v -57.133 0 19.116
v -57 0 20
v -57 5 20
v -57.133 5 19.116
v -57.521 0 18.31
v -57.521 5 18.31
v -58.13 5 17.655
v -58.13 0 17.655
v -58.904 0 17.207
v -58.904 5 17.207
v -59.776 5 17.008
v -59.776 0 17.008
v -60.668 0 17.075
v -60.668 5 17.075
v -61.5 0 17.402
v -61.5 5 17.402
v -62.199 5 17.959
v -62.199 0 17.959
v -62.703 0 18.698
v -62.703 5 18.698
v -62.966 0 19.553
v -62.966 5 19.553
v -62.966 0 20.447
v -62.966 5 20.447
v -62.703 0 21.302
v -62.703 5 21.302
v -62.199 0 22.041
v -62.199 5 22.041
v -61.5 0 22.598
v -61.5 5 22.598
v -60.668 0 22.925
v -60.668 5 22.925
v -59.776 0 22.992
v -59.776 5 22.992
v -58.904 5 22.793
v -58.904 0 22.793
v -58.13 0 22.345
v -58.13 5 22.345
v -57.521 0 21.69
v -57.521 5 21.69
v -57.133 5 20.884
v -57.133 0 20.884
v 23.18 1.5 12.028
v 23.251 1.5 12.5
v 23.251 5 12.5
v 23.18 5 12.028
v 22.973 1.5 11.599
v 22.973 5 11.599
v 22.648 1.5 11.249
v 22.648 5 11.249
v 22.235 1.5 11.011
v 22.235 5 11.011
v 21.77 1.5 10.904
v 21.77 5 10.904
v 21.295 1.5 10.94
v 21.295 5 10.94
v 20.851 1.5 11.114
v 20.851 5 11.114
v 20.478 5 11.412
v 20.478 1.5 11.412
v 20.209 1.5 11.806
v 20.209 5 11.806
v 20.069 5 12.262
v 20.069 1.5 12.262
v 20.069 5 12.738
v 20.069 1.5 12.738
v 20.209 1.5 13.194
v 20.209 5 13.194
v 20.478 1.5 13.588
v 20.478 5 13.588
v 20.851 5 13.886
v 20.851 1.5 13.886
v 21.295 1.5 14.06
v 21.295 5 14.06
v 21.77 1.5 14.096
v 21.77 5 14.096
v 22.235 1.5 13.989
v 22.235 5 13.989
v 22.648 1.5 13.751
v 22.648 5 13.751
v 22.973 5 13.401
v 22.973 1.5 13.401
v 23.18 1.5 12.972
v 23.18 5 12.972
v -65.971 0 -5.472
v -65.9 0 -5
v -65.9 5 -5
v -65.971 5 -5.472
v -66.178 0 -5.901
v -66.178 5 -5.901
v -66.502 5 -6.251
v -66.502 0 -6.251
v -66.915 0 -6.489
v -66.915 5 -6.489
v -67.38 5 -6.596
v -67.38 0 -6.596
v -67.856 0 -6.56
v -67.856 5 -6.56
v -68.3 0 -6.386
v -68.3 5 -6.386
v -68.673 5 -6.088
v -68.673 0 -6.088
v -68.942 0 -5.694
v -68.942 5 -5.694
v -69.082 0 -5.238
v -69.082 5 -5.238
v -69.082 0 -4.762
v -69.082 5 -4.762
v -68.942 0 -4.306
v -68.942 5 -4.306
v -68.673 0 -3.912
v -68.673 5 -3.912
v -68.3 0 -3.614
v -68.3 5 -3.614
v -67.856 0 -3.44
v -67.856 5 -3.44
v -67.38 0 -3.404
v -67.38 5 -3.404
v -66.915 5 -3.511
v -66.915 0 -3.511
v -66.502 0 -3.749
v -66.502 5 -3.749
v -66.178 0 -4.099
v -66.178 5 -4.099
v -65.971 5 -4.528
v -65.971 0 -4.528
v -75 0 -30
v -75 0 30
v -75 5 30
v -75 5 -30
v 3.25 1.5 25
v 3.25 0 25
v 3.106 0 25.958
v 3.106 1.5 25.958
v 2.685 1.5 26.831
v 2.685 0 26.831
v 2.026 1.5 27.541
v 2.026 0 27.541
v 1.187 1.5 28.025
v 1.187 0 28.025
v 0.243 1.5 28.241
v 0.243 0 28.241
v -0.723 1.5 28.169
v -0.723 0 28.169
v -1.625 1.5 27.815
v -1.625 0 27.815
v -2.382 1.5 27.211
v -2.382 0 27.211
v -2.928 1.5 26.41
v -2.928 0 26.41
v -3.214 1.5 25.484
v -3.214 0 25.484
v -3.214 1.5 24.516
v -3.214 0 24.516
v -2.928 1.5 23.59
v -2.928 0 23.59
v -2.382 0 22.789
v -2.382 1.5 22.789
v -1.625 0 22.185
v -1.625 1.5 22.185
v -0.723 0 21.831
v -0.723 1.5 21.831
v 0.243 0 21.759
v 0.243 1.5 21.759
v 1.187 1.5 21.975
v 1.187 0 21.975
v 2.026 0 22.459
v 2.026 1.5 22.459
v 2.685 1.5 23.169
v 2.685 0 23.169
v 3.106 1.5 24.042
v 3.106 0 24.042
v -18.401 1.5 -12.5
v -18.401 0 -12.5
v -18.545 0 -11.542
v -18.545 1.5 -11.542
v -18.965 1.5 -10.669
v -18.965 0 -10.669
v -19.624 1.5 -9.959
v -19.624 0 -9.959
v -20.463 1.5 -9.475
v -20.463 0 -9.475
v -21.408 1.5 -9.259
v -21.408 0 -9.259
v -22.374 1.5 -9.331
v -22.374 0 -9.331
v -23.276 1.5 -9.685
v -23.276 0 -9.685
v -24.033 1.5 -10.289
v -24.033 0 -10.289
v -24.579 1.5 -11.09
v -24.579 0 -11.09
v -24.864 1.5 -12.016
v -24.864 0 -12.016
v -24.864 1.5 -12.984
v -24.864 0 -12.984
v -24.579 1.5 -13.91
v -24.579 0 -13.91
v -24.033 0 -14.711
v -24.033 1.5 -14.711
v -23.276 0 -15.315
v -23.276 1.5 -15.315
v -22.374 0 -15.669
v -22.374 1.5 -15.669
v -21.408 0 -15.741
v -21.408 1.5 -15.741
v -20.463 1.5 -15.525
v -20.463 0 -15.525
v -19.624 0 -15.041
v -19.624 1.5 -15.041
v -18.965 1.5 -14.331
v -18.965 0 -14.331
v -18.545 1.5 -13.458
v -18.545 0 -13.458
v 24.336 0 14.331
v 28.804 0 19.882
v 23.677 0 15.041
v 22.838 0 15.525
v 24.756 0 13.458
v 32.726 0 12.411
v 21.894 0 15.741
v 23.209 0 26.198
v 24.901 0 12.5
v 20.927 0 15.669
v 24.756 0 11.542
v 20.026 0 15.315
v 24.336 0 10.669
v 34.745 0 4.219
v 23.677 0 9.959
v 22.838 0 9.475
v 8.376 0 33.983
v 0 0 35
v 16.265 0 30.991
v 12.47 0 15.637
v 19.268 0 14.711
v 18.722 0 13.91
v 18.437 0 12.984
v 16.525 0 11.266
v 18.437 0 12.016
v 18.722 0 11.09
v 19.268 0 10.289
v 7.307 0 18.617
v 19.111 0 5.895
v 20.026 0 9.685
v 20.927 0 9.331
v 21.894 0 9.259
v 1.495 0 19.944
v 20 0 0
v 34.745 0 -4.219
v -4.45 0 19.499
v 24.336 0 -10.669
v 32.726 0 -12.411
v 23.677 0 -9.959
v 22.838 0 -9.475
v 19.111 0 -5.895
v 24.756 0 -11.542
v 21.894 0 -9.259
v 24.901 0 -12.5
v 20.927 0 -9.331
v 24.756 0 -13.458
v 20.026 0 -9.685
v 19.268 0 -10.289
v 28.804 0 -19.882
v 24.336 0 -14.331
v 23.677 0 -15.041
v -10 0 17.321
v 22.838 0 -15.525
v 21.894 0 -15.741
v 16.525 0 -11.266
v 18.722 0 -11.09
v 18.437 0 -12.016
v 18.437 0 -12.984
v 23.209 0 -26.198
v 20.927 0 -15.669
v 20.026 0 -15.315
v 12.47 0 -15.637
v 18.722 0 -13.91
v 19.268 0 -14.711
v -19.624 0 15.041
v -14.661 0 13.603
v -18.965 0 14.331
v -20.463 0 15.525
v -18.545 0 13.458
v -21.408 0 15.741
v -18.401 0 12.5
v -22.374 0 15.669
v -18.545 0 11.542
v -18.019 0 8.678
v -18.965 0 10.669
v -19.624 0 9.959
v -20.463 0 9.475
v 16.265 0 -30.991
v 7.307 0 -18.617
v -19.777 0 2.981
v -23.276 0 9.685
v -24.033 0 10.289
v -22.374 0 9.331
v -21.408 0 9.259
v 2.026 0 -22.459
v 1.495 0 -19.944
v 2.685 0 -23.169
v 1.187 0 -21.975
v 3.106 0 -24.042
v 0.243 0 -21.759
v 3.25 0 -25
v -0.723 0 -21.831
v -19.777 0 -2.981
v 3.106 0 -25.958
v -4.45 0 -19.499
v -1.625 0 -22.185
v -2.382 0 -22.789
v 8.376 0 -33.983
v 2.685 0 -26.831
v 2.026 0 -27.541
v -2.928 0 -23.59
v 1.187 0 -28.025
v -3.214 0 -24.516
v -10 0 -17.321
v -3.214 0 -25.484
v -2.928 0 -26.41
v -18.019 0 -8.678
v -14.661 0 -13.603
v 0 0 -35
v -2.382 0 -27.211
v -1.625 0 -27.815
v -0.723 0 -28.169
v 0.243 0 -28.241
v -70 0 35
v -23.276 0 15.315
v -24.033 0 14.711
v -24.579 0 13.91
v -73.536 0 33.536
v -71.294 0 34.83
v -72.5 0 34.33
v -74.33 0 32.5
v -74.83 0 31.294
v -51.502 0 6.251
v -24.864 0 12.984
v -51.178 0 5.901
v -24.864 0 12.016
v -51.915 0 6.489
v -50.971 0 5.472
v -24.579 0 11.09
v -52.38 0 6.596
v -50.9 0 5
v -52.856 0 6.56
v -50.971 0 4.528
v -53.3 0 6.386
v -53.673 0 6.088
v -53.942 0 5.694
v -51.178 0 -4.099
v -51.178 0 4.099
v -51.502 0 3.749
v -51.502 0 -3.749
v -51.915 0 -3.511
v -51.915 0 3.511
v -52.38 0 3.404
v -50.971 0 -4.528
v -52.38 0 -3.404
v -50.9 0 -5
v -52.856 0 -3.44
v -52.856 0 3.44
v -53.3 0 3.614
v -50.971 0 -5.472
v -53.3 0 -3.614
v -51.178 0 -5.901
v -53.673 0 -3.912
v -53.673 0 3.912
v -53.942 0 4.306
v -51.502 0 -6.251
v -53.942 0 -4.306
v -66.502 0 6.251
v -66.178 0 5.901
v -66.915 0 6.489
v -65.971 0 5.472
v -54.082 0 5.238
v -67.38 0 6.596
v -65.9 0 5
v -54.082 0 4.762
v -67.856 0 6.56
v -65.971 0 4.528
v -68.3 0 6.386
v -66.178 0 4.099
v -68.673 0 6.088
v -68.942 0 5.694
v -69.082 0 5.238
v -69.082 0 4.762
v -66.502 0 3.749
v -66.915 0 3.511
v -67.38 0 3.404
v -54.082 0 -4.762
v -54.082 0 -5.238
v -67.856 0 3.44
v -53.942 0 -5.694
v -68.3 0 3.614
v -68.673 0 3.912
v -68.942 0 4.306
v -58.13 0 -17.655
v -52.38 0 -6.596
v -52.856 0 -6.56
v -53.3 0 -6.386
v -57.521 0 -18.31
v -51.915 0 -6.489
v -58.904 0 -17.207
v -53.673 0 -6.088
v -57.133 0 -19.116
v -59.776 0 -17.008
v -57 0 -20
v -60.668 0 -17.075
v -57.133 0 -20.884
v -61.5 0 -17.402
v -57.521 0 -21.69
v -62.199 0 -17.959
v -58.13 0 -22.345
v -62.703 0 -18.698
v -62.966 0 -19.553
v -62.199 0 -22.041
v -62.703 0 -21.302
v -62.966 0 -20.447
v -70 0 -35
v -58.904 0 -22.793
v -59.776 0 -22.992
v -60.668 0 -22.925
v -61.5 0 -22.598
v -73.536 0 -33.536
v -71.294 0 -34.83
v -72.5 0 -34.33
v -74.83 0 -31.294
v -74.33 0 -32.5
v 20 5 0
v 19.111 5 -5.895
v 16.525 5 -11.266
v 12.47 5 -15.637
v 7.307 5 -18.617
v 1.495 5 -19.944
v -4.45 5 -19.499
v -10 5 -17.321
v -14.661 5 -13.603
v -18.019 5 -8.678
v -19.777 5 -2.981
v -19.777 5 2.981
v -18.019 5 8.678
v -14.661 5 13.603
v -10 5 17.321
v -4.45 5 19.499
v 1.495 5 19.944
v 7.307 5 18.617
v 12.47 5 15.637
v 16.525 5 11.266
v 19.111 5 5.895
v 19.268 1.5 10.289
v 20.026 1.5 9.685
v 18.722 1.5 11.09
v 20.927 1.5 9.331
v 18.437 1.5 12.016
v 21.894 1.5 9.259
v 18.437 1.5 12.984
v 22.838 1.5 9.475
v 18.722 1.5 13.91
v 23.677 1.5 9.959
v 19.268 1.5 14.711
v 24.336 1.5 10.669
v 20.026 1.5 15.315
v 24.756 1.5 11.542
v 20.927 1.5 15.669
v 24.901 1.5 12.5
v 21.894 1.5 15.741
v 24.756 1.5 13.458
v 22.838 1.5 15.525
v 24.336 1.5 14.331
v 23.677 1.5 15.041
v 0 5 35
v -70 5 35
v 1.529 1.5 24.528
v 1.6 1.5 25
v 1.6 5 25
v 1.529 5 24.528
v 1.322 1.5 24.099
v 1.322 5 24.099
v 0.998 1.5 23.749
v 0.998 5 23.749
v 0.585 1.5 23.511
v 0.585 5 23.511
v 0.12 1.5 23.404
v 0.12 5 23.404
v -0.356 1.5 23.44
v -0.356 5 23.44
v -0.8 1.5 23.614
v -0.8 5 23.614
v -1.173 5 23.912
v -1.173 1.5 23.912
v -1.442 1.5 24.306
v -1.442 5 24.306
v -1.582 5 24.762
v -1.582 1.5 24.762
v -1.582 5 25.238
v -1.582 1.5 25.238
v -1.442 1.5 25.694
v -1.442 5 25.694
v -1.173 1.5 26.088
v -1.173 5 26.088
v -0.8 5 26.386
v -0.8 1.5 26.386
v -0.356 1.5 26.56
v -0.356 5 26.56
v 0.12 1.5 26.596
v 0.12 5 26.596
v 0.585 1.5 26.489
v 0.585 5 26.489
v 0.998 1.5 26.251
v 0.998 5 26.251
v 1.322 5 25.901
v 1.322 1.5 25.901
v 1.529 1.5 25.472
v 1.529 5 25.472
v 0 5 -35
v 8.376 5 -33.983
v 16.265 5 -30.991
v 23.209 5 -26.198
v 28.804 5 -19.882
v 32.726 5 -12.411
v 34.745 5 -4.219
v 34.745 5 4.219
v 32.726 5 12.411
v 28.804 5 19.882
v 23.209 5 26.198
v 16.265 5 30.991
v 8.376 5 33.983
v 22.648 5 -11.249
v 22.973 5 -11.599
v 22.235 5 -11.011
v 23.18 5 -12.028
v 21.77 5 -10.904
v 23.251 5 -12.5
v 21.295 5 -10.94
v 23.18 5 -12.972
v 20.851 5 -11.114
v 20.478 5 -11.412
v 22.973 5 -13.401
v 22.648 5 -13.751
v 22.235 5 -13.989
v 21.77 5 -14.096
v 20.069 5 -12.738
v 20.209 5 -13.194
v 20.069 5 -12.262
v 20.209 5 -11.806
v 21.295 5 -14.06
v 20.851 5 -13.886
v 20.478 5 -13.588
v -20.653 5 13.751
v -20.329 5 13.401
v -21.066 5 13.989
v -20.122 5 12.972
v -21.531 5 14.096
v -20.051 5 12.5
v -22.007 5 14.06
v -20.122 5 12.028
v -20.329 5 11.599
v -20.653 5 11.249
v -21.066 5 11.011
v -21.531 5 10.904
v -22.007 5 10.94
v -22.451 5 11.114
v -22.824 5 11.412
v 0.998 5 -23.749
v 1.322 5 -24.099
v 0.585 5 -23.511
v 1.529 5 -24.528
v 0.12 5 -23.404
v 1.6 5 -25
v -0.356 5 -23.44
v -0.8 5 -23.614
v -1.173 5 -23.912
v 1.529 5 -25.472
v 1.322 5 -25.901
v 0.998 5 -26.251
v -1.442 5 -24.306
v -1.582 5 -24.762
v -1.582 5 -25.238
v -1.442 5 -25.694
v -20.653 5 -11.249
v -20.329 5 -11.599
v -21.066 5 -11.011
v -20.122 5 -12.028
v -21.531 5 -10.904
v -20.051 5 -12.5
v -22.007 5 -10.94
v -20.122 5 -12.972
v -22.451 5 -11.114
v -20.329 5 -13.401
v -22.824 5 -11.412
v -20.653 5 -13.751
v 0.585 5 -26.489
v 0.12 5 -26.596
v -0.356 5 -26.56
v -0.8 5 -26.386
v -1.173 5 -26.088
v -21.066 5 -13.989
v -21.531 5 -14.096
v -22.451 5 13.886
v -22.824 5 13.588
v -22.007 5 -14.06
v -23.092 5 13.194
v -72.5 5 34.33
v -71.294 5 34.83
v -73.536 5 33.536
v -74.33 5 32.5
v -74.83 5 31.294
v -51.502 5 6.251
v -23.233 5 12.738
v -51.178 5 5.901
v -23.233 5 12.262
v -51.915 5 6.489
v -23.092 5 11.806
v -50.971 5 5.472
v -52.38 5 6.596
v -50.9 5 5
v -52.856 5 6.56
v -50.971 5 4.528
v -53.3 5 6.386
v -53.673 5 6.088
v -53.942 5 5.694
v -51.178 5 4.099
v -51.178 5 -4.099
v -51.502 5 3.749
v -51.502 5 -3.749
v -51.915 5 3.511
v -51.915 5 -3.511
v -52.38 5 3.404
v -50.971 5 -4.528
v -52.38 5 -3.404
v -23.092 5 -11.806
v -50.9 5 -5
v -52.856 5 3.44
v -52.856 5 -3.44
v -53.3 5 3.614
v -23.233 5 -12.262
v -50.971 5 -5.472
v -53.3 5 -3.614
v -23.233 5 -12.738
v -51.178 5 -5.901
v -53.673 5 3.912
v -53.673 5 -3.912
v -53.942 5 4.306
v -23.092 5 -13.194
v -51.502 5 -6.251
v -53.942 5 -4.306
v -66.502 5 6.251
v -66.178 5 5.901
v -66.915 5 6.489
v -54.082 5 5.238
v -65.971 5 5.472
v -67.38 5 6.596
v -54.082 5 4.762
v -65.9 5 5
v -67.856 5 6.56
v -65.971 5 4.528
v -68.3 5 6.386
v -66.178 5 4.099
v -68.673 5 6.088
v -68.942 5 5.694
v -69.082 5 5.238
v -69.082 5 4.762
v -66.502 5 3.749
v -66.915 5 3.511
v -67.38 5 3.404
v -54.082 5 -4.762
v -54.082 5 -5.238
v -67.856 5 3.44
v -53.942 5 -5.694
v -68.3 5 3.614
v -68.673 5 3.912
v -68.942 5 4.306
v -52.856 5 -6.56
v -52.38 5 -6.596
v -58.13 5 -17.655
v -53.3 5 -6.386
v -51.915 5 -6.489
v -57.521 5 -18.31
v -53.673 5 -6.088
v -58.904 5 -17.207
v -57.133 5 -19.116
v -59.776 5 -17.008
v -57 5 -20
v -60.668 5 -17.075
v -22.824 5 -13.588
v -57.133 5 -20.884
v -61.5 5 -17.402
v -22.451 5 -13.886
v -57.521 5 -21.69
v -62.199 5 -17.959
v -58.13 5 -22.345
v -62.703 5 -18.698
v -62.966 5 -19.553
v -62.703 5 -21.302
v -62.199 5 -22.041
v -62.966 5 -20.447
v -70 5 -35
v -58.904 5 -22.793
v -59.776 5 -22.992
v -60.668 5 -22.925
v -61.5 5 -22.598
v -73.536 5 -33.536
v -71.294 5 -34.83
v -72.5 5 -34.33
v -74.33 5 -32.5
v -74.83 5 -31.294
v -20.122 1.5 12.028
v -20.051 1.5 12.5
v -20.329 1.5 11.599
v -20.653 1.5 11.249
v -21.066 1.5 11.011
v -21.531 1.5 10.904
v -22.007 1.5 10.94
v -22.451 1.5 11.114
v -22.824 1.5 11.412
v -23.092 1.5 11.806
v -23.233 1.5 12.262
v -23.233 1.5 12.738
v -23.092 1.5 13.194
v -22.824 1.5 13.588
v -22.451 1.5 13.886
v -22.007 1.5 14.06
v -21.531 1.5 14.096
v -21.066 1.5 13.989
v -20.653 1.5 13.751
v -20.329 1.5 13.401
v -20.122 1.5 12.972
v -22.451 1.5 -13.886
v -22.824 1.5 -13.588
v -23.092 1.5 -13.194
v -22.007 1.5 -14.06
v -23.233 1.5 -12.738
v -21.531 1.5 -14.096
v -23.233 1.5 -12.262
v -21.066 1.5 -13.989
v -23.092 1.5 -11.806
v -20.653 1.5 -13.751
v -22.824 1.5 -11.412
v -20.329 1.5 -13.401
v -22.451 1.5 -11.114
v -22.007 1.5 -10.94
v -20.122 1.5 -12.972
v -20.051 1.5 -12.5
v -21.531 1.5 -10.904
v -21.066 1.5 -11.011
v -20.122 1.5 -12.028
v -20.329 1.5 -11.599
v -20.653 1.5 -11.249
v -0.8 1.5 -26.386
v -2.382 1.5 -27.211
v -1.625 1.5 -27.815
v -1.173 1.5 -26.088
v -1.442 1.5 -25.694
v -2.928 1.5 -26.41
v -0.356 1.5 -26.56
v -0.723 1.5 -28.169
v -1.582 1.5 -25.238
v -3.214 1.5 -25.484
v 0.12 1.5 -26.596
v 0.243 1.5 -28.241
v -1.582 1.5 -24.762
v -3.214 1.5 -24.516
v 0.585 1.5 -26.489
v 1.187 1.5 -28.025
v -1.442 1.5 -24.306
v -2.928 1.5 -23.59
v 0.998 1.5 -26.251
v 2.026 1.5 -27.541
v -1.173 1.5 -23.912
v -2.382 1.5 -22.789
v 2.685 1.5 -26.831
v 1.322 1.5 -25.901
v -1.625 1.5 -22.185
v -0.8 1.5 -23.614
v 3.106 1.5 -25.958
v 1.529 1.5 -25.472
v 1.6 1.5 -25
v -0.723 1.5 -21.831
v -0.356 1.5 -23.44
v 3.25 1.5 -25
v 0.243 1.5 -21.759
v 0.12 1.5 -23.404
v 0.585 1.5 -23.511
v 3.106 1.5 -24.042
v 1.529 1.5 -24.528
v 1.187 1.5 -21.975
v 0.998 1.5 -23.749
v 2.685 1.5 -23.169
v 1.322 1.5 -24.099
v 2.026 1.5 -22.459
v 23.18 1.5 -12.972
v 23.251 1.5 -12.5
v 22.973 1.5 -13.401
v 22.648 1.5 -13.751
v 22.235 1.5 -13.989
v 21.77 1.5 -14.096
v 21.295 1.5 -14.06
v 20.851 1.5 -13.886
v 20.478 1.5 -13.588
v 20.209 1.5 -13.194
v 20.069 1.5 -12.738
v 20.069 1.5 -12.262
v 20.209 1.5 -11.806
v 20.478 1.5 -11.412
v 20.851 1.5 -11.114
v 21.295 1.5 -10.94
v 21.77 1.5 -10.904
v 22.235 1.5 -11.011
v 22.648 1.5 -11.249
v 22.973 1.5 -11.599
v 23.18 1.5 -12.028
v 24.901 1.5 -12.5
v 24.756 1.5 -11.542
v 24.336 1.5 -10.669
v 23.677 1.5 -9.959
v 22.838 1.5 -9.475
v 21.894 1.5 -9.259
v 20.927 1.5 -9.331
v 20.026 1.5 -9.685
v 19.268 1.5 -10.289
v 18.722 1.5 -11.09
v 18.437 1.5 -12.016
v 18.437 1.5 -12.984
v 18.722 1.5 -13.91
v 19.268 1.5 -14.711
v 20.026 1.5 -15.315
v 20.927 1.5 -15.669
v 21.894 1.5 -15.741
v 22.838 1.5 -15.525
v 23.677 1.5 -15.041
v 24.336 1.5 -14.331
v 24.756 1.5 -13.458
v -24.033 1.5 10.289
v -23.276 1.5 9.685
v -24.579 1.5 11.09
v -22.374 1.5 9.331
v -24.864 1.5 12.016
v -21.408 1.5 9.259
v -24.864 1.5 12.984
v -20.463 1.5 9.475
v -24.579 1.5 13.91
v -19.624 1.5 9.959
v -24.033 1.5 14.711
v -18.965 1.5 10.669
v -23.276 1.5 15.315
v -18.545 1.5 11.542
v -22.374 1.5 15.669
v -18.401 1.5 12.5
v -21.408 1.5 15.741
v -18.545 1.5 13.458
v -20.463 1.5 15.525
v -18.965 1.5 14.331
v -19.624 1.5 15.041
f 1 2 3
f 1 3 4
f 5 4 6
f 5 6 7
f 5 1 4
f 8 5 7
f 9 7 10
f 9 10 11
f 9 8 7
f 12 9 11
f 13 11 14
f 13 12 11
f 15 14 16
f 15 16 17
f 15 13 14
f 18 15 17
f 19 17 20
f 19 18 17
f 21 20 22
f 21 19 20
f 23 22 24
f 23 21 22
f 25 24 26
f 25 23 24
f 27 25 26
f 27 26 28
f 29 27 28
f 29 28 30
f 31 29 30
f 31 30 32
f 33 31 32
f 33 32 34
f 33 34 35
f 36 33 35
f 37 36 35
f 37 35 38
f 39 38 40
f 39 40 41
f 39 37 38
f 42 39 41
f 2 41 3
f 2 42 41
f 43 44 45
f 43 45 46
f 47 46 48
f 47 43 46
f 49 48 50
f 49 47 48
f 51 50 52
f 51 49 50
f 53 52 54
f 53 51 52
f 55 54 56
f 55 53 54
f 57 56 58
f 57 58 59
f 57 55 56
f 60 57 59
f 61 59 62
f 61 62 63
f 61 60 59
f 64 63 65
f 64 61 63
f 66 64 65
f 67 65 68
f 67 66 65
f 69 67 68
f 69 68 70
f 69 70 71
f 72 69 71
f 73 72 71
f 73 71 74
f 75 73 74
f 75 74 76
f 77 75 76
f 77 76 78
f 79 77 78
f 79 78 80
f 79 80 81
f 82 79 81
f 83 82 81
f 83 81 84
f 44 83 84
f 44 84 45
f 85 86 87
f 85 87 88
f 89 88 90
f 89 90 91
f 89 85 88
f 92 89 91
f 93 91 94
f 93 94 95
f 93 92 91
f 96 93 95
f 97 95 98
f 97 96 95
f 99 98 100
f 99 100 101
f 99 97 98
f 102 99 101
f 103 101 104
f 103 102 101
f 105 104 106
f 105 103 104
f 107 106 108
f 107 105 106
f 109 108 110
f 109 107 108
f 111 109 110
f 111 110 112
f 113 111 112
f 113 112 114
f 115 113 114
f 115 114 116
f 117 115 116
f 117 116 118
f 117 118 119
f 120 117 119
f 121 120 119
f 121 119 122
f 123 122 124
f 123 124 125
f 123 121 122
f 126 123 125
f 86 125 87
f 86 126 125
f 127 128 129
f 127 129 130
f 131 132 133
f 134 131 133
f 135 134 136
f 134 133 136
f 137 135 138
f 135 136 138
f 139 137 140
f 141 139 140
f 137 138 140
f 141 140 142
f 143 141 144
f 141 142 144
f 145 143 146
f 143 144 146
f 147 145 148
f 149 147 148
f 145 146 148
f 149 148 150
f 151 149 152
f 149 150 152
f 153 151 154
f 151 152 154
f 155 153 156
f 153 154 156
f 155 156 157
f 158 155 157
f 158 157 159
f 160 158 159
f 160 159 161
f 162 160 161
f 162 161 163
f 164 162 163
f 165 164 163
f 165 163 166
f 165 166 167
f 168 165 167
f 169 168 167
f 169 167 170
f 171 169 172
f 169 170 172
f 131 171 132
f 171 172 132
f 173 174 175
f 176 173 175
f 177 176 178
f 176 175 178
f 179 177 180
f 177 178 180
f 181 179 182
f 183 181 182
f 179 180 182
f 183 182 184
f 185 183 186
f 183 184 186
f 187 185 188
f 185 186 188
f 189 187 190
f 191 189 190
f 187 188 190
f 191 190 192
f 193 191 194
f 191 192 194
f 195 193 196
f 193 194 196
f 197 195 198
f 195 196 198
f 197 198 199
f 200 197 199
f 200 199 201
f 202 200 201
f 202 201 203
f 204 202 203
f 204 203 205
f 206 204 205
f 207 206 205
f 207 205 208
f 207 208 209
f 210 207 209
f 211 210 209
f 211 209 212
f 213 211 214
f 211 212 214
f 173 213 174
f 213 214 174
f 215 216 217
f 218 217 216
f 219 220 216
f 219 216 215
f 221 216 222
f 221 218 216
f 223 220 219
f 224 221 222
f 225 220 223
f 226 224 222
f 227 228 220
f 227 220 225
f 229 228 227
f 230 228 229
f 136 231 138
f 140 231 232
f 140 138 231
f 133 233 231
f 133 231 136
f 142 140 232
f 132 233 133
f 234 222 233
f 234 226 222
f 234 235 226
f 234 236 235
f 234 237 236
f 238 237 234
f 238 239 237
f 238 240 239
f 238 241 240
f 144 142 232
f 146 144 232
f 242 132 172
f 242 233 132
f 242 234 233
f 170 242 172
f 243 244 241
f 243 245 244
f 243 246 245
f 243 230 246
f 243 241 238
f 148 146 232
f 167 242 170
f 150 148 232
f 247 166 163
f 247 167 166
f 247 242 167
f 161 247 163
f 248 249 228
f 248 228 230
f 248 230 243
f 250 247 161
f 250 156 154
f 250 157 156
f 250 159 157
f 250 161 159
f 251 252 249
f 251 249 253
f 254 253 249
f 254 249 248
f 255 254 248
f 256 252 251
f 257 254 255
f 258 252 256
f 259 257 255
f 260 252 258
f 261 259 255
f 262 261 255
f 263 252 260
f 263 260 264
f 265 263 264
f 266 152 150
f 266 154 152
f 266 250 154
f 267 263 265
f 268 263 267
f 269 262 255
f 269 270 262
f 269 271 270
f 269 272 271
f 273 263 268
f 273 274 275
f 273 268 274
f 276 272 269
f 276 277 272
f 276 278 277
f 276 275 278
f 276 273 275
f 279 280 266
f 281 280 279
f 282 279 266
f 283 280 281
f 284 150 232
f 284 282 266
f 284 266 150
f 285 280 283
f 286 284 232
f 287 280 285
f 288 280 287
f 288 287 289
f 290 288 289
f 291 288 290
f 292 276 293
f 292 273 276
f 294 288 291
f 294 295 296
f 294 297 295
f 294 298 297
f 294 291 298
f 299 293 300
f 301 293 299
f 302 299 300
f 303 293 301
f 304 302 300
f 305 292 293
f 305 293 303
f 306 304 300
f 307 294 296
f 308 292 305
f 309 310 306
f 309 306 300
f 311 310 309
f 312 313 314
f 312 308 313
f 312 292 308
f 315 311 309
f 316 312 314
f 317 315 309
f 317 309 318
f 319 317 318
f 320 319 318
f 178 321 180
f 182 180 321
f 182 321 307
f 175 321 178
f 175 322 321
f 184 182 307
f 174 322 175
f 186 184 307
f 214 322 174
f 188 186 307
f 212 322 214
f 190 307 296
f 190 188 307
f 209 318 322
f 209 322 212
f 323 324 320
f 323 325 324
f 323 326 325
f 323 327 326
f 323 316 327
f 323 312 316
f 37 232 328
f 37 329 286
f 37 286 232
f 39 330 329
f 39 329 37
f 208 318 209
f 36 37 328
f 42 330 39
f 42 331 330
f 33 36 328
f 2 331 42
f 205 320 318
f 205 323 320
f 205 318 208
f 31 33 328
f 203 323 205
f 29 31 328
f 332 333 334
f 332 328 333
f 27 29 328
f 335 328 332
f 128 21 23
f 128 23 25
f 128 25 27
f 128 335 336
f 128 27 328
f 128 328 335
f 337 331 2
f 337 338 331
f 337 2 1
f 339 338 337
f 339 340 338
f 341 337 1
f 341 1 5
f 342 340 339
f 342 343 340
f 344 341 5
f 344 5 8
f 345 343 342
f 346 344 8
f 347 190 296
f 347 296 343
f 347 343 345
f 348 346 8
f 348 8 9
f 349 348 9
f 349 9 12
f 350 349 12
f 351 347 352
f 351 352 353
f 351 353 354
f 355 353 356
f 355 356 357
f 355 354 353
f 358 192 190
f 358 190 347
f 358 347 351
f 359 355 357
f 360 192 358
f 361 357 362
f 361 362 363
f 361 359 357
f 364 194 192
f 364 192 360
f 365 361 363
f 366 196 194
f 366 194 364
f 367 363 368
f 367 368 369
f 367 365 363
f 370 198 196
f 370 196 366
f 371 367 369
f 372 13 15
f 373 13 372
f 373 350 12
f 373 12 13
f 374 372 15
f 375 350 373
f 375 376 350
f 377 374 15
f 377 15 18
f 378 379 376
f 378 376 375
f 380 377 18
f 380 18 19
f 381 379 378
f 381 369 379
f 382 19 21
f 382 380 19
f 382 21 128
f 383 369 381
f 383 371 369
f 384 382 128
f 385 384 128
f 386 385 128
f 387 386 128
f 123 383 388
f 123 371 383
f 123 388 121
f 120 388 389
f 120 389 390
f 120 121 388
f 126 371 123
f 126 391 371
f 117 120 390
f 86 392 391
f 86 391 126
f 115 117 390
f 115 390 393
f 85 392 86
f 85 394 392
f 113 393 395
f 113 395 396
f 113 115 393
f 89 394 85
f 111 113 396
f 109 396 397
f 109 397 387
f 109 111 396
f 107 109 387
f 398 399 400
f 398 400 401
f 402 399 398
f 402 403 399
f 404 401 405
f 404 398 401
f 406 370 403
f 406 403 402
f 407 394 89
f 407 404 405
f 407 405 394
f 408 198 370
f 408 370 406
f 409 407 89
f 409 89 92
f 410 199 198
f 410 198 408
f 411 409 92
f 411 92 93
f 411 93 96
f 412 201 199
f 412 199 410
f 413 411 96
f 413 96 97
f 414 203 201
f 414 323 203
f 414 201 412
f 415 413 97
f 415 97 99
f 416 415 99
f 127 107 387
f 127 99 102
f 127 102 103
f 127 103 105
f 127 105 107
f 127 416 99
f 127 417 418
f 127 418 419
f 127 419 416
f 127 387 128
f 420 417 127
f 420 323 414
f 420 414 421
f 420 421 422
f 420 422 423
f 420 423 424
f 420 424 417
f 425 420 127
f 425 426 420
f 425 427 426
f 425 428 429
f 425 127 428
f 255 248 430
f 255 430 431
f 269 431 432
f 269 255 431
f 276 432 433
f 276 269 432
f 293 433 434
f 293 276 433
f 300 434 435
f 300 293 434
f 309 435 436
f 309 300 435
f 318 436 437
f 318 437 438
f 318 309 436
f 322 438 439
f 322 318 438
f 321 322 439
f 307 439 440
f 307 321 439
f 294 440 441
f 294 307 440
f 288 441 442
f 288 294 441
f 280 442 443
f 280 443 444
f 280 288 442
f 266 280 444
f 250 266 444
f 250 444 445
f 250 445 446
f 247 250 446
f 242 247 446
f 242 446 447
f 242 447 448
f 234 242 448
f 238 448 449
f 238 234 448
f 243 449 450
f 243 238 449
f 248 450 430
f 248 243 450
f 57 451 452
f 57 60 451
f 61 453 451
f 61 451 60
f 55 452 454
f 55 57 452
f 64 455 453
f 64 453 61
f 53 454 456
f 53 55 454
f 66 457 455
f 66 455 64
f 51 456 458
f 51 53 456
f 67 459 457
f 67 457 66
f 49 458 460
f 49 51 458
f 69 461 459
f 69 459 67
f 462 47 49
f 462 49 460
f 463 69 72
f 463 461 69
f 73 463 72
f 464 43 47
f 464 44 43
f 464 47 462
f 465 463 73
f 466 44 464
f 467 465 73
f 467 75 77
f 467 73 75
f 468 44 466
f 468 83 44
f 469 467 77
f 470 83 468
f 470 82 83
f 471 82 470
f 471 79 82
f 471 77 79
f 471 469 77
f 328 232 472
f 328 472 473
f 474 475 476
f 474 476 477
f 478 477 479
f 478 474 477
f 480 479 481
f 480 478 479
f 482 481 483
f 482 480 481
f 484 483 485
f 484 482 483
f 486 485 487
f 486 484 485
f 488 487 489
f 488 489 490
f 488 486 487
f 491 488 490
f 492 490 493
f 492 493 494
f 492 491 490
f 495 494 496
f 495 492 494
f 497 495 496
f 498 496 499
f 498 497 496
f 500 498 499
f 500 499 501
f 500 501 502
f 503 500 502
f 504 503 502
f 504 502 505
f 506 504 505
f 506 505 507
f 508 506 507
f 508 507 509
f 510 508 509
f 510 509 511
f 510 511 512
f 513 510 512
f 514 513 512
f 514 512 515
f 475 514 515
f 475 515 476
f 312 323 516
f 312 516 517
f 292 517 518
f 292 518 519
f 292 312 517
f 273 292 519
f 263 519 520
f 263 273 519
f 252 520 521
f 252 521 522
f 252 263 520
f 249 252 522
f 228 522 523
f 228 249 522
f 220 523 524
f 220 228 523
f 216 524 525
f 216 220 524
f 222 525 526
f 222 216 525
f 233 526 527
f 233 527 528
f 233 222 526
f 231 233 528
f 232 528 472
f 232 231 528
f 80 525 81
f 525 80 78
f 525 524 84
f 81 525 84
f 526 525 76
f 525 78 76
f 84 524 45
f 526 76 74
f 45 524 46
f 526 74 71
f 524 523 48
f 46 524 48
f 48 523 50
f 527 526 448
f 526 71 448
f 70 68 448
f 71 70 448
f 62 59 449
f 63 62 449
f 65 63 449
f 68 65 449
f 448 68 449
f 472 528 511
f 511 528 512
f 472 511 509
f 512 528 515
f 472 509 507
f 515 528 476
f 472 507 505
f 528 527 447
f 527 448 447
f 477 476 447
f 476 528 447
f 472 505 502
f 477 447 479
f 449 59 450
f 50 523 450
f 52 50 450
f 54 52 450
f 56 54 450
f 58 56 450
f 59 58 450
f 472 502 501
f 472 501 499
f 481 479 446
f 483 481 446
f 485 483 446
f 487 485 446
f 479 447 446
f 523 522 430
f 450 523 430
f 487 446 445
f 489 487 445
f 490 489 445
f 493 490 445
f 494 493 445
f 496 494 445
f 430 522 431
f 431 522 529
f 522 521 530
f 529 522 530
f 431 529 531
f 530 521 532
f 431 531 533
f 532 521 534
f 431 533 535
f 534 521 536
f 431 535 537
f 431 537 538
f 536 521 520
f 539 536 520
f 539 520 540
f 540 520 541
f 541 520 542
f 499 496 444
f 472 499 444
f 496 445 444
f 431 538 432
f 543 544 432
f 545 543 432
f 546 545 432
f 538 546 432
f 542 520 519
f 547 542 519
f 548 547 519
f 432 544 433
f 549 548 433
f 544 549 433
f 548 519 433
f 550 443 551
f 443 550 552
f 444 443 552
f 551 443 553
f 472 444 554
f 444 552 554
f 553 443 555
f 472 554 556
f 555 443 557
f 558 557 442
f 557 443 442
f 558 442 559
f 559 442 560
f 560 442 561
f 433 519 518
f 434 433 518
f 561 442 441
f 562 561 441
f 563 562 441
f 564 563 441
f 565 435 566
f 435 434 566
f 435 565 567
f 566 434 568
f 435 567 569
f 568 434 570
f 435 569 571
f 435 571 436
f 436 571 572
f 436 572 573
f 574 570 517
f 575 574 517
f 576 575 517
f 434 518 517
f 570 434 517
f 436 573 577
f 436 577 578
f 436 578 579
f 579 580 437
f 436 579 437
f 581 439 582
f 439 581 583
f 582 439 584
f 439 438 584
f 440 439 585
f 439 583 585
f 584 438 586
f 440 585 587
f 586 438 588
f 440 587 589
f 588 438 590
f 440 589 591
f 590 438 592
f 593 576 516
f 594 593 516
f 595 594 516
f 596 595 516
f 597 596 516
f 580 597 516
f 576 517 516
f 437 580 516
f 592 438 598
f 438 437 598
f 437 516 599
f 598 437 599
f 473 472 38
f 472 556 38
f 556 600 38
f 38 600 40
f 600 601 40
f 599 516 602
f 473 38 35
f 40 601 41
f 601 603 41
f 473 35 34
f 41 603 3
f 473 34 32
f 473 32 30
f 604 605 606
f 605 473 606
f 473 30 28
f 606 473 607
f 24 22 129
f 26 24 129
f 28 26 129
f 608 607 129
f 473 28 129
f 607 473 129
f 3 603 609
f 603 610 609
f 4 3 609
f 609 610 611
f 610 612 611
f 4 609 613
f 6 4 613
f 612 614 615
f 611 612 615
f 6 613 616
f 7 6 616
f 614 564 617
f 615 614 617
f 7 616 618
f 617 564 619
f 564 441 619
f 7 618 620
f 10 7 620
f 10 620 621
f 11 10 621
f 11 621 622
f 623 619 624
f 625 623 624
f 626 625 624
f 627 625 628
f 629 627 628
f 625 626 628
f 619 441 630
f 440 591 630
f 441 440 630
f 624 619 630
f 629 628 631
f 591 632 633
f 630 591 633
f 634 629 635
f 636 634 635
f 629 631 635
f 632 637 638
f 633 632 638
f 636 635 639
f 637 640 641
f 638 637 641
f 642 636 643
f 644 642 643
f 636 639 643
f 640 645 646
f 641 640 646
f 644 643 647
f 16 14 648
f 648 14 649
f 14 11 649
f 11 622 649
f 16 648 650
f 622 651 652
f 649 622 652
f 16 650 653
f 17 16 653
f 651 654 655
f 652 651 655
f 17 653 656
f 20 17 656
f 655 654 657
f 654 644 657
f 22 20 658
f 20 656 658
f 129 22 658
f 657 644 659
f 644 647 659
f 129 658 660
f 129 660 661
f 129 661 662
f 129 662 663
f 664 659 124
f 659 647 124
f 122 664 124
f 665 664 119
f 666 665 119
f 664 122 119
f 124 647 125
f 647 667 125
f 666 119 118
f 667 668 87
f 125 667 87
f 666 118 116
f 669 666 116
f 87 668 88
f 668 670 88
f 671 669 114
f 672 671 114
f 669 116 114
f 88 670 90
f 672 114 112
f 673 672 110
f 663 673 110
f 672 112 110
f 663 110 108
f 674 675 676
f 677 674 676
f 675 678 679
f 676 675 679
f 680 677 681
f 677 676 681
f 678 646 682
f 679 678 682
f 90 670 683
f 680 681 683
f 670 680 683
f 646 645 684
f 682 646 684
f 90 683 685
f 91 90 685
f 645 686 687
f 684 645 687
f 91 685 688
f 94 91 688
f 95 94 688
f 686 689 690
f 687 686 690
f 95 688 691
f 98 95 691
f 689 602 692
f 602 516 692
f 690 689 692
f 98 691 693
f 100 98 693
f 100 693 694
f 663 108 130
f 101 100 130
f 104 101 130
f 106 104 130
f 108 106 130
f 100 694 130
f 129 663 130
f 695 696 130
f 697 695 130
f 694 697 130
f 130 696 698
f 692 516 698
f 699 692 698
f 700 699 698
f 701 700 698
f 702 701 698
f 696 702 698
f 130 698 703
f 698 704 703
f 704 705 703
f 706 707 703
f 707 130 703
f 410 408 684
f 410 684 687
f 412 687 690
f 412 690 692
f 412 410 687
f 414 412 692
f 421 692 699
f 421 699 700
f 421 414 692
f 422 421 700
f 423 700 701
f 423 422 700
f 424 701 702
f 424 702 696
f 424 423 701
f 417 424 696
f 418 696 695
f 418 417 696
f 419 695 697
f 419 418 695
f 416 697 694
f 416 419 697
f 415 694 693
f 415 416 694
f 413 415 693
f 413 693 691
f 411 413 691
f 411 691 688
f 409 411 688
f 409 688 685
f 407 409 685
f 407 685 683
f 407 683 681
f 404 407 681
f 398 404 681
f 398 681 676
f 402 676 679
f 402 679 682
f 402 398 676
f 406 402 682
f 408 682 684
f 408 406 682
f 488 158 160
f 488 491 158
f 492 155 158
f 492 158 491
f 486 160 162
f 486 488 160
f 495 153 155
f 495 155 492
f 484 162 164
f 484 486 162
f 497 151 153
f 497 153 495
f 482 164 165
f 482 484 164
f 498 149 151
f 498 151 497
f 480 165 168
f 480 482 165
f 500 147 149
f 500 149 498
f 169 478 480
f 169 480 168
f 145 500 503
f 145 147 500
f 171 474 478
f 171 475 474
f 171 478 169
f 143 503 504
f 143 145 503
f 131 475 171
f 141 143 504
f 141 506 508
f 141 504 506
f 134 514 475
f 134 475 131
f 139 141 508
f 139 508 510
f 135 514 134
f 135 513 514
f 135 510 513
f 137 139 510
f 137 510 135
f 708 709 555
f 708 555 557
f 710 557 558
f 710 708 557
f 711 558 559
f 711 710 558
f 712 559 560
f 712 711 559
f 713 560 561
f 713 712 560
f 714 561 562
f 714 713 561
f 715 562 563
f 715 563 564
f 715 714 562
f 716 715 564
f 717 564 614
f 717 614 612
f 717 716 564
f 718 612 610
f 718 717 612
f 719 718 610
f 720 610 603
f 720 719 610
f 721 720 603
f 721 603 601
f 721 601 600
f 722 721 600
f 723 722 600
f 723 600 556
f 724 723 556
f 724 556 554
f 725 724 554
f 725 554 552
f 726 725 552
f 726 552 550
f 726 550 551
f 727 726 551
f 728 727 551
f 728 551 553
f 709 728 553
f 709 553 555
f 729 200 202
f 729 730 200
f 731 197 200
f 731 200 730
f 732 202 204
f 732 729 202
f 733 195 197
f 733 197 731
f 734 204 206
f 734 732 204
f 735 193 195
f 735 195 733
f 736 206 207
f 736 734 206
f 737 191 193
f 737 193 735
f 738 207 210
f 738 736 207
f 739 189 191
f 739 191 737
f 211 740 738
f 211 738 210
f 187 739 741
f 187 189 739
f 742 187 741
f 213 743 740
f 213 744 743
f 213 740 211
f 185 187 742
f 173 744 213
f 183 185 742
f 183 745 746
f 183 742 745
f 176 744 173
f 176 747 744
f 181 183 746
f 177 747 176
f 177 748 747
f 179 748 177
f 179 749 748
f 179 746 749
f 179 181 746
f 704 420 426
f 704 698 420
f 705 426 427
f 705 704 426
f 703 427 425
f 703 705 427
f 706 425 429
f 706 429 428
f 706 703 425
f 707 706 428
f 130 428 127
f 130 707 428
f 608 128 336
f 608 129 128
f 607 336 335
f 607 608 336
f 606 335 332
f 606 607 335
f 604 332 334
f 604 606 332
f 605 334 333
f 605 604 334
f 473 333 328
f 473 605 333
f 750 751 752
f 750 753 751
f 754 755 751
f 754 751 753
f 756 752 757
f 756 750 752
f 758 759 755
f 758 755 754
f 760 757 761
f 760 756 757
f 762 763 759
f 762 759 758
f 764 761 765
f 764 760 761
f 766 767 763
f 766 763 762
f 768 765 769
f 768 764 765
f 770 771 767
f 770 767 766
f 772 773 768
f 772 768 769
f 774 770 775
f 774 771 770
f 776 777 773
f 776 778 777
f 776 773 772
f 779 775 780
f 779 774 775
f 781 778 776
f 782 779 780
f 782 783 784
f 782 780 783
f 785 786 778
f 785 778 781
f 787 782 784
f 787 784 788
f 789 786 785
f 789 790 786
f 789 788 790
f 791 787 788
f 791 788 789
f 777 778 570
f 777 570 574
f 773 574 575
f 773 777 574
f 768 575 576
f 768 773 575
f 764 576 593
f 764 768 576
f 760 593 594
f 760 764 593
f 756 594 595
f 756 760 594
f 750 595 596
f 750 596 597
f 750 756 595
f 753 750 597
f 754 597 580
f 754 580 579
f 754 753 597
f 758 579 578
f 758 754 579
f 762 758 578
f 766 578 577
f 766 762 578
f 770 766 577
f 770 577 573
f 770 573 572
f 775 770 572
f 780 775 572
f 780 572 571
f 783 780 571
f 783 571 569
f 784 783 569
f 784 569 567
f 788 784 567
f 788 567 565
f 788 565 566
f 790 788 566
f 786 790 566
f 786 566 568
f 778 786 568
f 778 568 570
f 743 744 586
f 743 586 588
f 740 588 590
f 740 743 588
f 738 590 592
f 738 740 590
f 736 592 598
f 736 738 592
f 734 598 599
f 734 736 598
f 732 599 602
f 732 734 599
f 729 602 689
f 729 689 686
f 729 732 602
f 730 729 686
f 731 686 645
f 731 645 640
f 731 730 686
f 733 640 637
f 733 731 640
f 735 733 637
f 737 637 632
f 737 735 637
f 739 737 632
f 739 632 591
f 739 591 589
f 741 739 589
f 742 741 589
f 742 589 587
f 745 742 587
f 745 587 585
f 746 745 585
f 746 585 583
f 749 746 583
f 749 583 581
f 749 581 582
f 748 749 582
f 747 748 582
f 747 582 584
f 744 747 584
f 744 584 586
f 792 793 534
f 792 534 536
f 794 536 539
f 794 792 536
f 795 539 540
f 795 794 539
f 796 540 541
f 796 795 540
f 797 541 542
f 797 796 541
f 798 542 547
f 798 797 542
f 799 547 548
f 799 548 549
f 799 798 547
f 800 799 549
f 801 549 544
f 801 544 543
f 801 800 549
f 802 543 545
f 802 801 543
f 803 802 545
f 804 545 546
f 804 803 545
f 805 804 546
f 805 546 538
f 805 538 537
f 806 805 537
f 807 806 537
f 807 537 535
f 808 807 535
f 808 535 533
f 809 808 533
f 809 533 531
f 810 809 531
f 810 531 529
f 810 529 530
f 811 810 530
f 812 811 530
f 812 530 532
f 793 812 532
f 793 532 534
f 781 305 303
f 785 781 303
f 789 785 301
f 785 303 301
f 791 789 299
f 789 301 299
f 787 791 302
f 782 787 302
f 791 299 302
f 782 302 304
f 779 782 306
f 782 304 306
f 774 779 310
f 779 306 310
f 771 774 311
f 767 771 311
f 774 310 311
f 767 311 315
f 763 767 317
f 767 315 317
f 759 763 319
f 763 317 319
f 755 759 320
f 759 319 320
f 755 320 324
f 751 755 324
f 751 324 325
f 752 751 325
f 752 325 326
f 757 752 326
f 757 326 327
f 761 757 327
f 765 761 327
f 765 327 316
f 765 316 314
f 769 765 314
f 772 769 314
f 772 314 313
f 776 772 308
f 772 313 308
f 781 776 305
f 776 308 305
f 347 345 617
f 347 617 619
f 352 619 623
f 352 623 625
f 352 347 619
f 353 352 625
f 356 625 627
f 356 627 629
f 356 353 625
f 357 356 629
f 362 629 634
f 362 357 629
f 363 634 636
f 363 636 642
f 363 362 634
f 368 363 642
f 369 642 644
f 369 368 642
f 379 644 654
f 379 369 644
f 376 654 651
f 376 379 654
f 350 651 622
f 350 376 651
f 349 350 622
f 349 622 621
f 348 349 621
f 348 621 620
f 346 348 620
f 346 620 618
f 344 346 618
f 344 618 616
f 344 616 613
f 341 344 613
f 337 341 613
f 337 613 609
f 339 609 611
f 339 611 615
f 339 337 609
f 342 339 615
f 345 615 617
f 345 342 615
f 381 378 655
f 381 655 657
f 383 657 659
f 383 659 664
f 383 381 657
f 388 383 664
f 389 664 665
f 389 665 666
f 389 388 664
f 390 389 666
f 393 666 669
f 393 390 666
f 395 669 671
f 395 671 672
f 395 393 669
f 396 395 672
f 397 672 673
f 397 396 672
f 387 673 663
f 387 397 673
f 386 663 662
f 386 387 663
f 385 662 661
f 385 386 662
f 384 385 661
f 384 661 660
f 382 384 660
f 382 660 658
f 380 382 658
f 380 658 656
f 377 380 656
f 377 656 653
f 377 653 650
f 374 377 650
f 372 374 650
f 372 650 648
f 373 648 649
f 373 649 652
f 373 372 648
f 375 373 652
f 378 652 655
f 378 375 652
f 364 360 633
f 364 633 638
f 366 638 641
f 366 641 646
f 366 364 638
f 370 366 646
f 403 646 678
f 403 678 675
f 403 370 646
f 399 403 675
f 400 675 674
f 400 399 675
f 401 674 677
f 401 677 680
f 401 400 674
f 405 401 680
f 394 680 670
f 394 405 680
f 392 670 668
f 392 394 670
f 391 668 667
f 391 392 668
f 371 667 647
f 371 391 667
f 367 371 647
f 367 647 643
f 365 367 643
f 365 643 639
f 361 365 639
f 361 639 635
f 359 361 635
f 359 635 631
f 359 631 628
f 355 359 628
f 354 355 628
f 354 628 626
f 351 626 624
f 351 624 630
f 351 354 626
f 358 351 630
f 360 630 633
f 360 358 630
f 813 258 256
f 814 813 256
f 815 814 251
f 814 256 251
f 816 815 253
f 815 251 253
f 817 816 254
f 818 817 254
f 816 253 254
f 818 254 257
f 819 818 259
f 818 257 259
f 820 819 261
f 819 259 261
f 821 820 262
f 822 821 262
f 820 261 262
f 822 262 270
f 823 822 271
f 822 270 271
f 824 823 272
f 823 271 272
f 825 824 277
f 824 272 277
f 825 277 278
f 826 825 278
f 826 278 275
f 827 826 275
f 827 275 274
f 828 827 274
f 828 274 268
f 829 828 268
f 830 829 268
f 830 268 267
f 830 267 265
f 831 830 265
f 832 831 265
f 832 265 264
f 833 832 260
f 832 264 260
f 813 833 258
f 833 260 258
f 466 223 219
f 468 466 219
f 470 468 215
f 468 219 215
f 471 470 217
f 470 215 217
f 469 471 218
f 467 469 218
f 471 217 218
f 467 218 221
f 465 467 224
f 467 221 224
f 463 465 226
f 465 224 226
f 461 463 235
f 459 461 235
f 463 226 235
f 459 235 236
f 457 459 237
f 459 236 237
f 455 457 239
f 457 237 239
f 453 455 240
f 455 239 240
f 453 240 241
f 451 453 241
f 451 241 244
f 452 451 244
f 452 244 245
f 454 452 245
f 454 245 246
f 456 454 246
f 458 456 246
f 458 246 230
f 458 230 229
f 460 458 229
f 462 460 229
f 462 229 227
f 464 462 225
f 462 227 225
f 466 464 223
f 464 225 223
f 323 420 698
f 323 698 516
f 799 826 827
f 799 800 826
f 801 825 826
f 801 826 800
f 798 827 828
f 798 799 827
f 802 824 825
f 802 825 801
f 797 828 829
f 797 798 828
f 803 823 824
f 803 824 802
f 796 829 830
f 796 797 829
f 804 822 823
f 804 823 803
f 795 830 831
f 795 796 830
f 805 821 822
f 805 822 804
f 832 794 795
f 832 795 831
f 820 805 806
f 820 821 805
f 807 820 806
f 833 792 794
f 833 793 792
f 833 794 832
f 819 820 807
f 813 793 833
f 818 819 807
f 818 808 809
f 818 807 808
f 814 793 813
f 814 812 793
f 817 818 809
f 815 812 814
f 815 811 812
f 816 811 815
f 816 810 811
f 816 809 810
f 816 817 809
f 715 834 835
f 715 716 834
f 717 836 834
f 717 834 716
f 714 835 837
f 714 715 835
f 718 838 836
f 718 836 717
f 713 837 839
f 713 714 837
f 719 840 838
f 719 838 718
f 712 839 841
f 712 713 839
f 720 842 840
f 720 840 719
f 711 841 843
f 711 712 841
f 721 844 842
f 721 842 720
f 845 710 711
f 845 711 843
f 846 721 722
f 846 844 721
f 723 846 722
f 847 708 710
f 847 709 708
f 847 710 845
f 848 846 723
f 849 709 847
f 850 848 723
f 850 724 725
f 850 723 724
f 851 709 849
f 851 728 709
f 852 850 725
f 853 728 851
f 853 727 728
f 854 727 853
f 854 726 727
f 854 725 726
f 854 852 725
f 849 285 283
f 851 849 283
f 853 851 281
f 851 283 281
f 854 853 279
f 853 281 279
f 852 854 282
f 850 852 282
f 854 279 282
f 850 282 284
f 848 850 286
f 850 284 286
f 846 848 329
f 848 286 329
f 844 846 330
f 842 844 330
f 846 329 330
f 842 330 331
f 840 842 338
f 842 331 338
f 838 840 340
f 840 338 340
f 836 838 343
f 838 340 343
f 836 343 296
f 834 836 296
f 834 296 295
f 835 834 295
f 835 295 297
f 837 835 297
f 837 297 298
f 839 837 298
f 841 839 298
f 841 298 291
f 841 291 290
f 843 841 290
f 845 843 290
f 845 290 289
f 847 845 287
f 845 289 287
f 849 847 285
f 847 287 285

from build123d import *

# Parameters (mm, degrees)
SKETCH1_R           = 1.6
SKETCH1_R_2         = 20
SKETCH1_R_3         = 3
BOSS_EXTRUDE1_DEPTH = 5
FILLET1_R           = 5
SKETCH4_R           = 3.25
CUT_EXTRUDE2_DEPTH  = 1.5


with BuildPart() as part:
    # Sketch1 → Boss-Extrude1 (new body)
    with BuildSketch(Plane(origin=(0, 0, 0), x_dir=(1, 0, 0), z_dir=(0, 1, 0))):
        with BuildLine():
            Line((-75, 35), (0, 35))
            ThreePointArc((0, 35), (35, 0), (0, -35))
            Line((0, -35), (-75, -35))
            Line((-75, -35), (-75, 35))
        make_face()
        with Locations((0, 25)):
            Circle(SKETCH1_R, mode=Mode.SUBTRACT)
        with Locations((21.650635095, 12.5)):
            Circle(SKETCH1_R, mode=Mode.SUBTRACT)
        with Locations((21.650635095, -12.5)):
            Circle(SKETCH1_R, mode=Mode.SUBTRACT)
        with Locations((0, -25)):
            Circle(SKETCH1_R, mode=Mode.SUBTRACT)
        with Locations((-21.650635095, -12.5)):
            Circle(SKETCH1_R, mode=Mode.SUBTRACT)
        with Locations((-21.650635095, 12.5)):
            Circle(SKETCH1_R, mode=Mode.SUBTRACT)
        Circle(SKETCH1_R_2, mode=Mode.SUBTRACT)
        with Locations((-67.5, 5)):
            Circle(SKETCH1_R, mode=Mode.SUBTRACT)
        with Locations((-52.5, 5)):
            Circle(SKETCH1_R, mode=Mode.SUBTRACT)
        with Locations((-52.5, -5)):
            Circle(SKETCH1_R, mode=Mode.SUBTRACT)
        with Locations((-67.5, -5)):
            Circle(SKETCH1_R, mode=Mode.SUBTRACT)
        with Locations((-60, 20)):
            Circle(SKETCH1_R_3, mode=Mode.SUBTRACT)
        with Locations((-60, -20)):
            Circle(SKETCH1_R_3, mode=Mode.SUBTRACT)
    extrude(amount=BOSS_EXTRUDE1_DEPTH)

    # Fillet1
    fillet1_edges = [part.edges().sort_by_distance(p)[0] for p in [
        (-75, 2.5, -35),
        (-75, 2.5, 35),
    ]]
    fillet(fillet1_edges, radius=FILLET1_R)

    # Sketch4 → Cut-Extrude2 (cut)
    with BuildSketch(Plane.XZ):
        with Locations((0, 25)):
            Circle(SKETCH4_R)
        with Locations((21.650635095, 12.5)):
            Circle(SKETCH4_R)
        with Locations((21.650635095, -12.5)):
            Circle(SKETCH4_R)
        with Locations((0, -25)):
            Circle(SKETCH4_R)
        with Locations((-21.650635095, -12.5)):
            Circle(SKETCH4_R)
        with Locations((-21.650635095, 12.5)):
            Circle(SKETCH4_R)
    extrude(amount=-CUT_EXTRUDE2_DEPTH, mode=Mode.SUBTRACT)


solid = part.part
